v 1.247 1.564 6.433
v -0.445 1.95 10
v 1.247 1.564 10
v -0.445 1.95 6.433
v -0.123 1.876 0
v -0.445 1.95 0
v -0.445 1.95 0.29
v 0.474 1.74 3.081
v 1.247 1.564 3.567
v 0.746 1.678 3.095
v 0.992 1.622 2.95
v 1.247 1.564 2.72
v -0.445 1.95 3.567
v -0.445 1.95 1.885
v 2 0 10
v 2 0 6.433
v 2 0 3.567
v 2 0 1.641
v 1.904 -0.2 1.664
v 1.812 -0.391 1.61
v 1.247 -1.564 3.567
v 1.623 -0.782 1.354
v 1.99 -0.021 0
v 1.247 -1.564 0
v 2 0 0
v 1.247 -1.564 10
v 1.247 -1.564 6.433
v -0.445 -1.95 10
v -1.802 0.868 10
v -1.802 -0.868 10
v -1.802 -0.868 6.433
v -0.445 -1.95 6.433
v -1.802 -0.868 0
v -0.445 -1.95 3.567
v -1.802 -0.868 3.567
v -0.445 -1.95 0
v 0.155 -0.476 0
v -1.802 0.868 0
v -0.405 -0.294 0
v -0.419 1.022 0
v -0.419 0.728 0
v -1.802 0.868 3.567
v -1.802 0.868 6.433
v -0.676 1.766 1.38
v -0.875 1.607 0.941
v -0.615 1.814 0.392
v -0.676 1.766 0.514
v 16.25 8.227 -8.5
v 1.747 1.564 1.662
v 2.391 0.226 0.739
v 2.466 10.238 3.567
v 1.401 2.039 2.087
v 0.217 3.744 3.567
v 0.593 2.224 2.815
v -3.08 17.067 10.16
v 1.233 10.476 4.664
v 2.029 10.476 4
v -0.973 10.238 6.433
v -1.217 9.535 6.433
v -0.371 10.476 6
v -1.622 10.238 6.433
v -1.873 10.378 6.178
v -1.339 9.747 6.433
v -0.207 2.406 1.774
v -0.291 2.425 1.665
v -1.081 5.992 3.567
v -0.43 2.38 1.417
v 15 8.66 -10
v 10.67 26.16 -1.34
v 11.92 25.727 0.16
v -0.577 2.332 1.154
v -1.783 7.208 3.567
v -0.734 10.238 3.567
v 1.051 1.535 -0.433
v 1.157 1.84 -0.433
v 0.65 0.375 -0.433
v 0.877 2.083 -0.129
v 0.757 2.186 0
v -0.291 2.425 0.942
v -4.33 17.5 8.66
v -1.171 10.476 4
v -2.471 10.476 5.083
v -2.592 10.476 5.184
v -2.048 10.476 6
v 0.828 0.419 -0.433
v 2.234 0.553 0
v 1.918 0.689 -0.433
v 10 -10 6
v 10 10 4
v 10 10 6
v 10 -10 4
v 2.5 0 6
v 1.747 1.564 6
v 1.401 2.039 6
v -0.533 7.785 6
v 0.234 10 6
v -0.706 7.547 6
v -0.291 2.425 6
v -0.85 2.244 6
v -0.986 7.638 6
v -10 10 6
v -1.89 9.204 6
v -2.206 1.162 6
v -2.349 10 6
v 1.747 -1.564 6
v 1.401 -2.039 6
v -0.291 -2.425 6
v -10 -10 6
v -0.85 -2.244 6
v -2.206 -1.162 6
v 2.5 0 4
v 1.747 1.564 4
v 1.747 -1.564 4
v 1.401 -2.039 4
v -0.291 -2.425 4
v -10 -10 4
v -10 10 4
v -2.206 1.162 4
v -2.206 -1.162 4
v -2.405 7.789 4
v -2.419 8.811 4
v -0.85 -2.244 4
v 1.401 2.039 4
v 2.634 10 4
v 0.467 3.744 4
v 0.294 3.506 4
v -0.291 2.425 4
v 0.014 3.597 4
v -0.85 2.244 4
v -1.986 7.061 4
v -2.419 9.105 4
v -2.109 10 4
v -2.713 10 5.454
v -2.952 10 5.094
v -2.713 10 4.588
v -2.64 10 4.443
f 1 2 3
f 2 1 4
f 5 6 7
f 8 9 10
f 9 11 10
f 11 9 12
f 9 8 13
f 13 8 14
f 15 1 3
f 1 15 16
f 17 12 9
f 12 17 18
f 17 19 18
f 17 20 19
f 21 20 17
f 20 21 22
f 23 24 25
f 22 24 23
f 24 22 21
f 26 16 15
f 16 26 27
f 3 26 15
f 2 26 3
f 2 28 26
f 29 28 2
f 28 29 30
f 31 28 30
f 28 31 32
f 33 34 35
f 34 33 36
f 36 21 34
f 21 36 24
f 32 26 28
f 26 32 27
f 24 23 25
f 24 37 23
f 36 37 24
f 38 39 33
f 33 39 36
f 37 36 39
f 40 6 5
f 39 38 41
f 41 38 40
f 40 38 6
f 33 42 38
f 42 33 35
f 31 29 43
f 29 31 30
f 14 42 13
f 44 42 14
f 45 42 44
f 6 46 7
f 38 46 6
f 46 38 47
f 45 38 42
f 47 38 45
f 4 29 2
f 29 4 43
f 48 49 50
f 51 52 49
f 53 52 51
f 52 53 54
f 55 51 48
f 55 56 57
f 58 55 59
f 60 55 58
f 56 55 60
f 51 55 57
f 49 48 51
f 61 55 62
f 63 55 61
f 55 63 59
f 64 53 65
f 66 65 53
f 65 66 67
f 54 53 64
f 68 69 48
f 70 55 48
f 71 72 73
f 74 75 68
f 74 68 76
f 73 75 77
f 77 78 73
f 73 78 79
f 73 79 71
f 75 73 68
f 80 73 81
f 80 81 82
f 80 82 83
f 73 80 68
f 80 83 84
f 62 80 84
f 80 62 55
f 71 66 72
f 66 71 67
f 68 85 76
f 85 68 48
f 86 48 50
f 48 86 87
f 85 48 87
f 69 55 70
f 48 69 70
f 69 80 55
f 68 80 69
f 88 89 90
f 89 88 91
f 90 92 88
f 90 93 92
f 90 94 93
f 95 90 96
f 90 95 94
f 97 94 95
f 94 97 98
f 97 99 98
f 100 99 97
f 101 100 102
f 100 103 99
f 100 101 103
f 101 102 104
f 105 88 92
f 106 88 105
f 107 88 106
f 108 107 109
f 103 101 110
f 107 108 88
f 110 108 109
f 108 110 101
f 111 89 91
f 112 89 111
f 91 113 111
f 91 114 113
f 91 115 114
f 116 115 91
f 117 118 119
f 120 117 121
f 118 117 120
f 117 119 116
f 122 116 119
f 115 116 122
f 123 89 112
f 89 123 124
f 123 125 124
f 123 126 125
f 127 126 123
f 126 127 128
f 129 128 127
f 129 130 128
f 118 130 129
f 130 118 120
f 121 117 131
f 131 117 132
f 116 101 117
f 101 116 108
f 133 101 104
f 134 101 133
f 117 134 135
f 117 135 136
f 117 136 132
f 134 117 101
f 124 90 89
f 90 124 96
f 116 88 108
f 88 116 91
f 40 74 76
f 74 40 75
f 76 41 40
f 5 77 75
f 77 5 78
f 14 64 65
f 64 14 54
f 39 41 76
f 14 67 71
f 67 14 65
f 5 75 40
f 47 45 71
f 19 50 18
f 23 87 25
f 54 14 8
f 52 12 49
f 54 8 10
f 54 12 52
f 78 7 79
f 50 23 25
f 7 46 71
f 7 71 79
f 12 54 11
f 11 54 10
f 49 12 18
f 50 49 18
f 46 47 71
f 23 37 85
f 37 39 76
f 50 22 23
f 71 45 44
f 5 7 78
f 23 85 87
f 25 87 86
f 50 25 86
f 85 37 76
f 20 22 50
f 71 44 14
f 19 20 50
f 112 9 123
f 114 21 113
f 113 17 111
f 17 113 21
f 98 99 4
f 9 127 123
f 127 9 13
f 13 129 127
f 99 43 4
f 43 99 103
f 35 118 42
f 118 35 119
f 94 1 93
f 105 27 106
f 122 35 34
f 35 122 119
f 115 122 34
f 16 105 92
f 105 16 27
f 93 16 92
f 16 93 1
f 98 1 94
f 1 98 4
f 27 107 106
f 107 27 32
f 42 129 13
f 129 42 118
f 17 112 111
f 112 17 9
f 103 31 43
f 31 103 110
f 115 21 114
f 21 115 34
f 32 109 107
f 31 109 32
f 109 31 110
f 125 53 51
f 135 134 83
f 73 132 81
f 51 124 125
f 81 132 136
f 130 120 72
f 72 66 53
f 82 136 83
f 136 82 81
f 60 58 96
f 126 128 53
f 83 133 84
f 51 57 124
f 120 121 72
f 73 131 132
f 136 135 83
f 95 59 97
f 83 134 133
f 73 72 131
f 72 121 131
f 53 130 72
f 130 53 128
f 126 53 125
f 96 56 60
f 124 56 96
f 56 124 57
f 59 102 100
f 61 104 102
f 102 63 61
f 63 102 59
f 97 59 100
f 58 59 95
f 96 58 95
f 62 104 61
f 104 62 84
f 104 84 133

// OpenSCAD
//Chamfer_3d(mode="fast") {
//Chamfer_3d(mode="fast",dir=[true,true,false,false,true,true]) {
nhf_part_chamfer(mode="sphere") {
//Chamfer_3d(mode="cube") {
//Chamfer_3d([[0,1],[0,2],[1,2]],.5) {
//Chamfer_3d([[0,1],[0,2]]) {
//Chamfer_3d([[0,1],[0,2]],.5) {
   cylinder(r=2,h=10);
   
   rotate([30,30,30])
   cube([20,20,2]);
   
   translate([0,0,5])
   cube([20,20,2],center=true);
};

//-----------------------------------------------
// Create a chamfer between two or more surfaces
//
// A subset of surface pairs may be specified
//
// Call with N = List of surface subsets
//           N = [[child#,child#],[child#,child#,]...]
//           for 2 objects N = [[0,1]]
//           for 3 objects intersection 0 and 1 N = [[0,1],[0,2]]
// dr   = chamfer height (approx)
// mode = chamfer mode: fast (uses shifting), sphere, cube (use minkowski())
// dir  = use to restrict shifting in certain directions          
module nhf_part_chamfer(N,dr=.5,mode="fast",dir=[true,true,true,true,true,true]) {
    // for two arrays, generate permutations of their members
    // generate [1,2], exclude [1,1] and [2,1]
    function permutations(arr1,arr2) = [
              for(i=0, j=1; (i<len(arr1)) && (j<len(arr2)); 
                  i= (j==len(arr2)-1) ? i+1 : i, 
                  j= (j==len(arr2)-1) ? i+1 : j+1) 
              [arr1[i],arr2[j]]];
    // generate permutations of an array's members with itself
    function permSelf(arr) = permutations(arr,arr);

    //--------------------------------------------------
    // Expand a child object by shifting or minkowski
    // Since the center of an object is not known, 
    //     a simple scale(S) children() is not possible
    //
    // An object can be expanded by creating a composite object
    // either using minkowski() children(); sphere(r),cube(r,center=true) etc.
    // or by shifting the object on multiple axis
    //
    // dr   = absolute expansion
    // mode = fast (uses shifting), sphere, cube (use minkowski())
    // dir  = use to restrict shifting in certain directions          

    module Expand_3d(dr = .5, mode="fast", dir=[true,true,true,true,true,true]) {
       
       assert(((mode=="fast")||(mode=="sphere")||(mode=="cube")));
        
       if (mode=="fast") {

          shiftList= [[dr,0,0],[-dr,0,0],[0,dr,0],[0,-dr,0],[0,0,dr],[0,0,-dr]];
          for(i=[0:5]) {
              if (dir[i] == true) {
                  translate(shiftList[i])
                      children();
              }
          }
               
       } else {
          minkowski() {
             children();
             if (mode=="sphere") { sphere(r=dr); } 
             else if (mode=="cube") { cube(dr,center=true); }
          }
       }
    }

   children();

   _n = (N != undef) ? N : permSelf([for(i=[0:$children-1]) i]);

   for (i=_n) {
      hull() {
         intersection() {
            children(i[0]);
            Expand_3d(dr,mode,dir) 
            children(i[1]);
         }
         
         intersection() {
            Expand_3d(dr,mode,dir) 
            children(i[0]);
            children(i[1]);
         }
      }
   }
}
